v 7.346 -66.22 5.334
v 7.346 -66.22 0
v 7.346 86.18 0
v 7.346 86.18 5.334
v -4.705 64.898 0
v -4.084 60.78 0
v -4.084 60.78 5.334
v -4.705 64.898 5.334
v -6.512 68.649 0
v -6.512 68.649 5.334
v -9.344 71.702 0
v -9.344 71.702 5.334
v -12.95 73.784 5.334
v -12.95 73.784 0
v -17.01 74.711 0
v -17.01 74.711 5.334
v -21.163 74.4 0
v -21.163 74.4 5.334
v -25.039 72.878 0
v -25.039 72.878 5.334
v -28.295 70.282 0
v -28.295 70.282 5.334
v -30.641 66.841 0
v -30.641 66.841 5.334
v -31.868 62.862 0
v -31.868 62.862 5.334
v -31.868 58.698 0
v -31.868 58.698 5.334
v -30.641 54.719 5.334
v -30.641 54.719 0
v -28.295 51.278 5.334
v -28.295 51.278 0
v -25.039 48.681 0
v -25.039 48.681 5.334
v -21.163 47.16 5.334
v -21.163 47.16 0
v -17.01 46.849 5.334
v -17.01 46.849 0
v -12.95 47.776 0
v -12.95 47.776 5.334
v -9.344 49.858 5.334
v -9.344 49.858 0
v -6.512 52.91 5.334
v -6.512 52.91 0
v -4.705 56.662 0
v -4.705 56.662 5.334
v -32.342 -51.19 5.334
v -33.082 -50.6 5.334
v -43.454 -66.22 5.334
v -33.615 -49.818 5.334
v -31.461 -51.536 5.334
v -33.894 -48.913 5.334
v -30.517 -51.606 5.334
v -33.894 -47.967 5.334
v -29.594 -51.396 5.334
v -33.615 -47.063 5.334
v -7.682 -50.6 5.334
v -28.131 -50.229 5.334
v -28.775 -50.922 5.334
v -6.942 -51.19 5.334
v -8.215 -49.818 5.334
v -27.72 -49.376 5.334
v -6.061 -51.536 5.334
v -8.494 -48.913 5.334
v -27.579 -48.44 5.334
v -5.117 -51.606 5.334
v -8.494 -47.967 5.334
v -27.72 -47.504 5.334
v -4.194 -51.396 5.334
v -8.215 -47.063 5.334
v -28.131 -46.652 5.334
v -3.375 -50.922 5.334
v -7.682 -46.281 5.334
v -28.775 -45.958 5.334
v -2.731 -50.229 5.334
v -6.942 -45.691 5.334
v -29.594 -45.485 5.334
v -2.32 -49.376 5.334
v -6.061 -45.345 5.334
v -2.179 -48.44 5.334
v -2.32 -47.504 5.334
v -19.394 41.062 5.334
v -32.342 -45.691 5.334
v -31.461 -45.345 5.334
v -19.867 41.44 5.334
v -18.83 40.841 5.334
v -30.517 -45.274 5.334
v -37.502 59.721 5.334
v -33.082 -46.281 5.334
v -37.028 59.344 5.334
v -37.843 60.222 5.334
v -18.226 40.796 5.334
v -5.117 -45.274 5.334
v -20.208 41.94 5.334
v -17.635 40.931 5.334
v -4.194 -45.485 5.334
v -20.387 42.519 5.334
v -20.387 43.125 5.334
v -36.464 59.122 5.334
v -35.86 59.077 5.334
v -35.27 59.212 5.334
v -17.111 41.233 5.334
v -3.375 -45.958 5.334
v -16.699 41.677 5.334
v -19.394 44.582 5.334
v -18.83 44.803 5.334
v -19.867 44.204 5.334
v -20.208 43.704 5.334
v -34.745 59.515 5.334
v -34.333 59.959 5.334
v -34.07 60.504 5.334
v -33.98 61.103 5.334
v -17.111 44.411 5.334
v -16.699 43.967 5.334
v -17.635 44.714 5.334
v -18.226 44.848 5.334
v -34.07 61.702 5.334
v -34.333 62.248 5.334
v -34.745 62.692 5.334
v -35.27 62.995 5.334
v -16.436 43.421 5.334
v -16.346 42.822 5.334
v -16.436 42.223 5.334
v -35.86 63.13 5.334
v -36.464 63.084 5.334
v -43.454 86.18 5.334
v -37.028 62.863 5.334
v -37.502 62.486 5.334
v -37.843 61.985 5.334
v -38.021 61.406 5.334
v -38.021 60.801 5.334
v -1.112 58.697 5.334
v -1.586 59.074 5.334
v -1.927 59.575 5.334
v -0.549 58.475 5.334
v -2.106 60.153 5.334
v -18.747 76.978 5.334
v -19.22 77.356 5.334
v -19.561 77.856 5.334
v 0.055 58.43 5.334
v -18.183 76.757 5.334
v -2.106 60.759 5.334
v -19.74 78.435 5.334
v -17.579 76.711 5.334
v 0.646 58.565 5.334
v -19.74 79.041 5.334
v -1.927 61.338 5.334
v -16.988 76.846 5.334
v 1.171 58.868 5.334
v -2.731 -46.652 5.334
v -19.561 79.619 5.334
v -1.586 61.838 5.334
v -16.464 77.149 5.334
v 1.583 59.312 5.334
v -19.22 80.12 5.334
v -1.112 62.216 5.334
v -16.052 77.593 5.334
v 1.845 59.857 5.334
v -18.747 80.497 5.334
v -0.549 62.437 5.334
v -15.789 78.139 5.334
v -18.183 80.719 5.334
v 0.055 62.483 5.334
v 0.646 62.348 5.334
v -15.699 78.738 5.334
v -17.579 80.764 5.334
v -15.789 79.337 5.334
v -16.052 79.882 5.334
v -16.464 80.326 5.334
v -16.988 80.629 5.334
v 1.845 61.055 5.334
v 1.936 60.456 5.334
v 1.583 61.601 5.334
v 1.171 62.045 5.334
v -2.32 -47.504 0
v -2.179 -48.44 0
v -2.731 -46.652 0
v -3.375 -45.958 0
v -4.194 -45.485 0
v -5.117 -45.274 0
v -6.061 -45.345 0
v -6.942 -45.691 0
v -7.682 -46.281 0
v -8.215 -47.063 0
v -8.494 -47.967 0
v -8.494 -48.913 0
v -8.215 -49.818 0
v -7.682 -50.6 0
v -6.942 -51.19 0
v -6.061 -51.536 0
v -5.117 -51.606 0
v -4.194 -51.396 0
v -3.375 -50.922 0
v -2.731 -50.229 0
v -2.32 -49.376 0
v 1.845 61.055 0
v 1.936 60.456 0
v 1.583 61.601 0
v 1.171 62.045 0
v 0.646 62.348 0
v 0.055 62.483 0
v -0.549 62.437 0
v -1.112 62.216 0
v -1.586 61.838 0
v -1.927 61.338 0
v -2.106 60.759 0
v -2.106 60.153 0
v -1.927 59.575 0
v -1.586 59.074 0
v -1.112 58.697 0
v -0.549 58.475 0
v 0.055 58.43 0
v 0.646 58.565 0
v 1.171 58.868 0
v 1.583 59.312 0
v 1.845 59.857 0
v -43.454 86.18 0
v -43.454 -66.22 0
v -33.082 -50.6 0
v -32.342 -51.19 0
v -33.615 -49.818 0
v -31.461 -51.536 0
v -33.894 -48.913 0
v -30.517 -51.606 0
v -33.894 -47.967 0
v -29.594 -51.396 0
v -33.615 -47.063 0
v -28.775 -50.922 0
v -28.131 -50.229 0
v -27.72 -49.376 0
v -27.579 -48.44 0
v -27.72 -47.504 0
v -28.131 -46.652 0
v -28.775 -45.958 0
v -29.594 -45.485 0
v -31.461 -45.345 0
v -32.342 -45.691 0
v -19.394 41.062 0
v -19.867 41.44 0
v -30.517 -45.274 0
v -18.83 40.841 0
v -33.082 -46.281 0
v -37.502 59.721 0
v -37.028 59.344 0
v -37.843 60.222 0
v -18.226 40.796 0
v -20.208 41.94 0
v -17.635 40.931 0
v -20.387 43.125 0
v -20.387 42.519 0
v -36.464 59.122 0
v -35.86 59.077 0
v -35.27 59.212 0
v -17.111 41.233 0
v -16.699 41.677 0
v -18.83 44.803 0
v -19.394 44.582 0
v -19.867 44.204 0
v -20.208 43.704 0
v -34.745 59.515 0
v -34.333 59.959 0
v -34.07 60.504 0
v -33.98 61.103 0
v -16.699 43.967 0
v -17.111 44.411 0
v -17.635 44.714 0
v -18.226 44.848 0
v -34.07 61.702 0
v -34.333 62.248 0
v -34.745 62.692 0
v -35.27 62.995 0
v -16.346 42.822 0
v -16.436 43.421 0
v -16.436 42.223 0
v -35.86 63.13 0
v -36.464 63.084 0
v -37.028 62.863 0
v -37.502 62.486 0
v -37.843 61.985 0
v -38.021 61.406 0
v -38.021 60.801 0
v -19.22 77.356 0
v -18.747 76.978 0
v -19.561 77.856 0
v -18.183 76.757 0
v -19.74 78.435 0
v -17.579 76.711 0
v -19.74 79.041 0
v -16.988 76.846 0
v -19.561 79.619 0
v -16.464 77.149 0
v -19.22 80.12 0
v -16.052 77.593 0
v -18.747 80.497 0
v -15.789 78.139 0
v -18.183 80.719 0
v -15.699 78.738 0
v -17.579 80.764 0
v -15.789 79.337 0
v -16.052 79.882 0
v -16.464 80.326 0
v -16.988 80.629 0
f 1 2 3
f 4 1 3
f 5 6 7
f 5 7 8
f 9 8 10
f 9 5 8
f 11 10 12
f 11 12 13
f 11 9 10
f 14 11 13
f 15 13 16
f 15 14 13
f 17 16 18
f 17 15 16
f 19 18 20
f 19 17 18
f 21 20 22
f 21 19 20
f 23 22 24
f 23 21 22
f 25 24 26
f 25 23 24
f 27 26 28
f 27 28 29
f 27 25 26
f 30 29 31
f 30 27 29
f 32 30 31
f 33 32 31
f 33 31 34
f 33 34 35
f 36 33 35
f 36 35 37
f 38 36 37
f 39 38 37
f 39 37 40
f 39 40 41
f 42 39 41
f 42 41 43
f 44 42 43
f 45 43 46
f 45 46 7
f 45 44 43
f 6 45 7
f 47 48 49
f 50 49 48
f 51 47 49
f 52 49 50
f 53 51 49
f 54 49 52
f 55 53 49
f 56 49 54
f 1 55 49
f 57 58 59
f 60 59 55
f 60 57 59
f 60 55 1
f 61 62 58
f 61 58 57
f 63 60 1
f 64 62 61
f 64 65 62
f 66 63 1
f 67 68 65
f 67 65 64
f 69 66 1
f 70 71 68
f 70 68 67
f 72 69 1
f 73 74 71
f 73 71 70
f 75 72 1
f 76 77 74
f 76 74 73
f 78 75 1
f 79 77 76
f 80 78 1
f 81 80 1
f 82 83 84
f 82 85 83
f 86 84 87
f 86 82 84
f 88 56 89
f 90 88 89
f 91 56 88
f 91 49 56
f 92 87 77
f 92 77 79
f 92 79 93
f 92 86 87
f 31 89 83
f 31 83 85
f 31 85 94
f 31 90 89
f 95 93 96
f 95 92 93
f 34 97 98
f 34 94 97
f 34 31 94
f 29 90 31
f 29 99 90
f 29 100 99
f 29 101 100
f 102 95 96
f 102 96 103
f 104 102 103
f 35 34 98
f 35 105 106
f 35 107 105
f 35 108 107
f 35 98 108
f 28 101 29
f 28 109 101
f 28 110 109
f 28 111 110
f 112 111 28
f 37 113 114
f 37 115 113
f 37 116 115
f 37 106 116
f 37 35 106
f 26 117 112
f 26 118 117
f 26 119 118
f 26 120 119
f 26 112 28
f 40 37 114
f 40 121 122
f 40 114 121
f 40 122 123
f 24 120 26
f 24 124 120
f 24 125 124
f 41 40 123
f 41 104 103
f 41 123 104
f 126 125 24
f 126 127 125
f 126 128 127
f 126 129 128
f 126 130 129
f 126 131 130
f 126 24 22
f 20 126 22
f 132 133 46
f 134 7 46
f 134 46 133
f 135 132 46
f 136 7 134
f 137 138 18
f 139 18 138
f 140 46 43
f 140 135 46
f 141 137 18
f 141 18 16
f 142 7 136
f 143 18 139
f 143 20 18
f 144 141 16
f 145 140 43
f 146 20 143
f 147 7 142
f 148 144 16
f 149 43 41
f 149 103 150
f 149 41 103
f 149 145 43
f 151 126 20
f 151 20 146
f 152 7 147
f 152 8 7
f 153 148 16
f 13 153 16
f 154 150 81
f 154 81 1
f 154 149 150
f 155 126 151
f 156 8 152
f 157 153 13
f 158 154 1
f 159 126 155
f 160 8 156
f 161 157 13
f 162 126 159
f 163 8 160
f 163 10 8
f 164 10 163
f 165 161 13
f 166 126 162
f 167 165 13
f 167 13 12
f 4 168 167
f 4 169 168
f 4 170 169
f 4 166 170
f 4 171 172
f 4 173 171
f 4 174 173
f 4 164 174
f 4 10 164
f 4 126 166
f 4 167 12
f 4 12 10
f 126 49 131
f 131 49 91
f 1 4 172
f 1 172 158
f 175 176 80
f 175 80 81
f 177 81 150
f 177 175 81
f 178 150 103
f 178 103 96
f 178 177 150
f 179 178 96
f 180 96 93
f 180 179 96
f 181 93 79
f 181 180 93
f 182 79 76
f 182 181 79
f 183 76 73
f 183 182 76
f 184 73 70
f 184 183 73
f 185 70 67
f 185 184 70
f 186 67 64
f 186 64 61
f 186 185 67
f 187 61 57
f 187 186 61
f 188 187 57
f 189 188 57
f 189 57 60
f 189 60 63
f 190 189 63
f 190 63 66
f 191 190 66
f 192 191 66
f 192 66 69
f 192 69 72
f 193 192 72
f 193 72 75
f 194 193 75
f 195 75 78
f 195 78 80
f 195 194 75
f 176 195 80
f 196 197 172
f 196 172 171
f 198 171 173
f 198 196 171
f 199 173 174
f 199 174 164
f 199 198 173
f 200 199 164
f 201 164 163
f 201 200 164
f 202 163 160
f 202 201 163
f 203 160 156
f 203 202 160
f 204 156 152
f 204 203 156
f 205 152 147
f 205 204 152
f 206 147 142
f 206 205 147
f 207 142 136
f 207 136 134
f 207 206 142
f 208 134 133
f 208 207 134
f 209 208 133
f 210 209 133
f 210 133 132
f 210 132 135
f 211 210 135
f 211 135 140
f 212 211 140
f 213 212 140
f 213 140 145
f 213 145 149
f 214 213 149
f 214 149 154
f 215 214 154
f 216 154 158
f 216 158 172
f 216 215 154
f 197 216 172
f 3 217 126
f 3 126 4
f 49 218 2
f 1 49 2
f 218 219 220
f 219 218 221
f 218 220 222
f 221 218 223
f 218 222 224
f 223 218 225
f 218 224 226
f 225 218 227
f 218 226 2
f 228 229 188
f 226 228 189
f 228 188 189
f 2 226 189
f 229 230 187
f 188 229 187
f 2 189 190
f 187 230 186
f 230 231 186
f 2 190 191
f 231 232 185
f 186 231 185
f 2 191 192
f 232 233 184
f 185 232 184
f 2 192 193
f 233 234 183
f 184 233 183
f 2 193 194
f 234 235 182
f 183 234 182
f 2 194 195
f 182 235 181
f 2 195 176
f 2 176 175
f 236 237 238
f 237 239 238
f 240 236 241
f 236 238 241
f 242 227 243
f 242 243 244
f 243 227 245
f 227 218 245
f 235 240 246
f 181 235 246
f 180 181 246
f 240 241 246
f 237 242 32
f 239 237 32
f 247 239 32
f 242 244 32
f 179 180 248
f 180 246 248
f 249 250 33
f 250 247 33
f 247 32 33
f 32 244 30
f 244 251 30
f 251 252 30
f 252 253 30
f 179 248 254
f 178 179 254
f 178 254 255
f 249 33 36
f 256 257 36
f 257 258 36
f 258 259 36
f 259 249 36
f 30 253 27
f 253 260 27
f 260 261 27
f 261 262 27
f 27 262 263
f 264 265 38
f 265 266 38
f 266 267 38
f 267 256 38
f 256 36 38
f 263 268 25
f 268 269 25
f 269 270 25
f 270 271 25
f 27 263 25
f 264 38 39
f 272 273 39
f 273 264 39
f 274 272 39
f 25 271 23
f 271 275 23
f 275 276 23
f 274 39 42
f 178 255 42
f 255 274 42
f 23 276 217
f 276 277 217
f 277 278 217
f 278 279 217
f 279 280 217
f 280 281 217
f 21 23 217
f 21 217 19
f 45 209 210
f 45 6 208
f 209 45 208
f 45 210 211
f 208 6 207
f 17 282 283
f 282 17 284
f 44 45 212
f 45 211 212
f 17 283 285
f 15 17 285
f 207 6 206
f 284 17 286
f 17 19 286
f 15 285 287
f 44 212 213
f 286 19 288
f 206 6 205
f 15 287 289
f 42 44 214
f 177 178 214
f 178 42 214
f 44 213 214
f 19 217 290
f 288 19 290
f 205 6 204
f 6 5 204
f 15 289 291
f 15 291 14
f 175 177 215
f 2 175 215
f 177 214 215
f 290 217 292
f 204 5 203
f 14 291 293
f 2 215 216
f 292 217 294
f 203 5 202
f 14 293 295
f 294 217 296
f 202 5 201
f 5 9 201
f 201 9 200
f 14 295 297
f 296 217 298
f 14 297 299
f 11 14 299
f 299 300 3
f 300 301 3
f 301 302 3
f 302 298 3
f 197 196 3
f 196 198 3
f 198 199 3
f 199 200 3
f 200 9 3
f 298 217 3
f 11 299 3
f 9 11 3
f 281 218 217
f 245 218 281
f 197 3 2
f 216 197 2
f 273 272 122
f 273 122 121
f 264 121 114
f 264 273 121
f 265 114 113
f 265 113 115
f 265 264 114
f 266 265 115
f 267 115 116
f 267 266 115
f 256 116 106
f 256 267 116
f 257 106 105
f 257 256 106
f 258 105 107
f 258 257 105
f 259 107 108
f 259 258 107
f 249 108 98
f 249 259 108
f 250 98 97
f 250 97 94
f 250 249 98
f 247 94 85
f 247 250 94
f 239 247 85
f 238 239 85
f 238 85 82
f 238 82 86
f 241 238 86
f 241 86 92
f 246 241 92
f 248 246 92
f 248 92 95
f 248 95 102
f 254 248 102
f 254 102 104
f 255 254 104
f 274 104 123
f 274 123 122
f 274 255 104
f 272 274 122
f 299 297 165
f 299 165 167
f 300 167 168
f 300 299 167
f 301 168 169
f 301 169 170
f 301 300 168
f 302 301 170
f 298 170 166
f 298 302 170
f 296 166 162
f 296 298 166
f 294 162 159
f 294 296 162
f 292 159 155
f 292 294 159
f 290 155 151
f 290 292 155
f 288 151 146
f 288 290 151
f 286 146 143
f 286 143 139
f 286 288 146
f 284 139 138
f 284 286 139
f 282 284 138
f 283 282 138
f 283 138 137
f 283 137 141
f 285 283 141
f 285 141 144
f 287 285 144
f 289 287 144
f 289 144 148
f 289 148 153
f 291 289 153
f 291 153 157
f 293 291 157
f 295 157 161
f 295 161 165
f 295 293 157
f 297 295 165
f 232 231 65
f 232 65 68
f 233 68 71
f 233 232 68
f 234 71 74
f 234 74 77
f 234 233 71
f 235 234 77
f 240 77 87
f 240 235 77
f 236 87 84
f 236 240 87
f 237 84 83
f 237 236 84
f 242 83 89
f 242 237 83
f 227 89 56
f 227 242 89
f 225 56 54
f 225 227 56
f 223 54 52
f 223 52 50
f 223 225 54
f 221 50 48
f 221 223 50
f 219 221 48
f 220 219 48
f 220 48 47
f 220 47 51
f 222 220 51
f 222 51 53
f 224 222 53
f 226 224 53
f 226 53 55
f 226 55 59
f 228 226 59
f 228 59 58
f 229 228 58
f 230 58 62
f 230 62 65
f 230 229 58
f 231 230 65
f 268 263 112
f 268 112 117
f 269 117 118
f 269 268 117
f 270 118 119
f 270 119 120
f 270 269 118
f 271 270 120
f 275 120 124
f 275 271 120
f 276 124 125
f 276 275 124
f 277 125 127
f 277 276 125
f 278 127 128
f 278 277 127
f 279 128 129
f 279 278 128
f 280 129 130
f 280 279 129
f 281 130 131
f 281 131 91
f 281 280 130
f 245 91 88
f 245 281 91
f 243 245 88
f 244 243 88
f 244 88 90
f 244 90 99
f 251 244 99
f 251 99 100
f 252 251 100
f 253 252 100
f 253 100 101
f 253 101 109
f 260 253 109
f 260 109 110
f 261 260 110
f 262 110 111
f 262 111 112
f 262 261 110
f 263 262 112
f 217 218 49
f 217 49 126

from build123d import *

# Parameters (mm, degrees)
F0_W     = 50.8
F0_H     = 152.4
F0_R     = 3.175
F0_R_2   = 2.032
F0_R_3   = 13.97
F1_DEPTH = 5.334
F2_R     = 3.175
F3_DEPTH = 25.4


with BuildPart() as f1:
    # F0 (on Top) → F1 (new body)
    with BuildSketch(Plane.XY):
        with Locations((-18.054181, 9.979866)):
            Rectangle(F0_W, F0_H)
        with Locations((-30.754181, -48.440134)):
            Circle(F0_R, mode=Mode.SUBTRACT)
        with Locations((-5.354181, -48.440134)):
            Circle(F0_R, mode=Mode.SUBTRACT)
        with Locations((-18.377712, 42.822066)):
            Circle(F0_R_2, mode=Mode.SUBTRACT)
        with Locations((-36.011981, 61.103397)):
            Circle(F0_R_2, mode=Mode.SUBTRACT)
        with Locations((-18.054181, 60.779866)):
            Circle(F0_R_3, mode=Mode.SUBTRACT)
        with Locations((-17.730651, 78.737666)):
            Circle(F0_R_2, mode=Mode.SUBTRACT)
        with Locations((-0.096381, 60.456336)):
            Circle(F0_R_2, mode=Mode.SUBTRACT)
    extrude(amount=F1_DEPTH)

    # F2 (on face) → F3 (cut)
    with BuildSketch(Plane(origin=(0, 0, 0), x_dir=(1, 0, 0), z_dir=(0, 0, -1))):
        with Locations((-5.354181, 48.440134)):
            Circle(F2_R)
        with Locations((-30.754181, 48.440134)):
            Circle(F2_R)
    extrude(amount=-F3_DEPTH, mode=Mode.SUBTRACT)


solid = f1.part
